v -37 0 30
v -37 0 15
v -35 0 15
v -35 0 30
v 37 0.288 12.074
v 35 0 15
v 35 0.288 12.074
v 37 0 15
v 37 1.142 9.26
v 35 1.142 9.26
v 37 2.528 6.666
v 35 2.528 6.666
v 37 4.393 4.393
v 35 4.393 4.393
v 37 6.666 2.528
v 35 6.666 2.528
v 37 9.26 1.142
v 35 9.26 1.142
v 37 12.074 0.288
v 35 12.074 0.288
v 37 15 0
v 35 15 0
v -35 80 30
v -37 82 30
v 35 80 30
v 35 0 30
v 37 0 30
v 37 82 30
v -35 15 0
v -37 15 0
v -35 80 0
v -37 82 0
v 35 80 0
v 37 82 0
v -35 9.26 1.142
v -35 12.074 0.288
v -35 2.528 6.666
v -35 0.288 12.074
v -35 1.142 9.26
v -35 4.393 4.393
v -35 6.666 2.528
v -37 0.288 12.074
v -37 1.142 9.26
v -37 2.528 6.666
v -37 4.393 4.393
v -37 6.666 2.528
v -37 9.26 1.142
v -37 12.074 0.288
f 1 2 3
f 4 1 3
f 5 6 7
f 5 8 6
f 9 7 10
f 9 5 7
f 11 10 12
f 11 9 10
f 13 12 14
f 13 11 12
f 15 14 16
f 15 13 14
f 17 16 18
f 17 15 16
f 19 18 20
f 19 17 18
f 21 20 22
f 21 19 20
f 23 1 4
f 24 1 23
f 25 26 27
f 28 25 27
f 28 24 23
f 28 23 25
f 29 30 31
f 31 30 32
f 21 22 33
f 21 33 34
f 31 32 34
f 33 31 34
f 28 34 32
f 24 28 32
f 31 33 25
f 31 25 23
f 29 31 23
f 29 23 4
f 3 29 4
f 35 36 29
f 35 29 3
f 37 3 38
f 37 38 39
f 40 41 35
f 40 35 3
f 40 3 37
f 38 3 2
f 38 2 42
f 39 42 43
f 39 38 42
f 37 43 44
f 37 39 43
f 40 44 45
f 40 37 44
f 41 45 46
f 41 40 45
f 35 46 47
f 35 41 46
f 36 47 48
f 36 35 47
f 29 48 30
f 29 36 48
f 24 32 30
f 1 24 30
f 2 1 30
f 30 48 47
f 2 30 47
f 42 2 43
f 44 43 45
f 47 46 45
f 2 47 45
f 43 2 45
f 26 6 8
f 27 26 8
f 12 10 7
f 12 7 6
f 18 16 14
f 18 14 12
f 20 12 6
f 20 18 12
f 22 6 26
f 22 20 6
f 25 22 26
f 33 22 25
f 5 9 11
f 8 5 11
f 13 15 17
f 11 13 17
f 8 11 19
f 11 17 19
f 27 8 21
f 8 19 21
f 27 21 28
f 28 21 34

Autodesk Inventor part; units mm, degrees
ref_plane "YZ Plane" through (0, 0, 0) normal (1, 0, 0) x (0, 1, 0)
ref_plane "XZ Plane" through (0, 0, 0) normal (0, 1, 0) x (-1, 0, 0)
ref_plane "XY Plane" through (0, 0, 0) normal (0, 0, 1) x (1, 0, 0)
sketch "Эскиз1" plane through (0, 0, 0) normal (0, 0, 1) x (1, 0, 0)
  line L0 (-37, 0) -> (37, 0)
  line L1 (37, 0) -> (37, 82)
  line L2 (37, 82) -> (-37, 82)
  line L3 (-37, 82) -> (-37, 0)
  line L4 (-35, 0) -> (35, 0)
  line L5 (35, 0) -> (35, 80)
  line L6 (35, 80) -> (-35, 80)
  line L7 (-35, 80) -> (-35, 0)
  line L8 (0, -16.4) -> (0, 98.4) projected
  point P0 (0, 0)
  dimension "d0" = 70
  dimension "d1" = 80
  dimension "d2" = 2
  dimension "d3" = 2
  dimension "d4" = 2
extrude "Выдавливание1" add sketch "Эскиз1" along normal blind 30 contours L3 L2 L8 L6 L7 L0 | L2 L1 L0 L5 L6 L8
fillet "Сопряжение1" radius 15 2 edges at (36, 0, 0) (-36, 0, 0)
properties part number "выступ АКБ"
